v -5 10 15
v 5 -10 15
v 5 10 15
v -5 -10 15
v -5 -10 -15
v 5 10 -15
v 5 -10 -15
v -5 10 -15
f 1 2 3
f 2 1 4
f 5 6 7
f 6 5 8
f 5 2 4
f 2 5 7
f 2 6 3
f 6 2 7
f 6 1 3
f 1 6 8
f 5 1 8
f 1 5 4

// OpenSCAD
// Generated by scadwright. Do not hand-edit —
// edit the Python source and regenerate.

cube([10, 20, 30], center=true);
